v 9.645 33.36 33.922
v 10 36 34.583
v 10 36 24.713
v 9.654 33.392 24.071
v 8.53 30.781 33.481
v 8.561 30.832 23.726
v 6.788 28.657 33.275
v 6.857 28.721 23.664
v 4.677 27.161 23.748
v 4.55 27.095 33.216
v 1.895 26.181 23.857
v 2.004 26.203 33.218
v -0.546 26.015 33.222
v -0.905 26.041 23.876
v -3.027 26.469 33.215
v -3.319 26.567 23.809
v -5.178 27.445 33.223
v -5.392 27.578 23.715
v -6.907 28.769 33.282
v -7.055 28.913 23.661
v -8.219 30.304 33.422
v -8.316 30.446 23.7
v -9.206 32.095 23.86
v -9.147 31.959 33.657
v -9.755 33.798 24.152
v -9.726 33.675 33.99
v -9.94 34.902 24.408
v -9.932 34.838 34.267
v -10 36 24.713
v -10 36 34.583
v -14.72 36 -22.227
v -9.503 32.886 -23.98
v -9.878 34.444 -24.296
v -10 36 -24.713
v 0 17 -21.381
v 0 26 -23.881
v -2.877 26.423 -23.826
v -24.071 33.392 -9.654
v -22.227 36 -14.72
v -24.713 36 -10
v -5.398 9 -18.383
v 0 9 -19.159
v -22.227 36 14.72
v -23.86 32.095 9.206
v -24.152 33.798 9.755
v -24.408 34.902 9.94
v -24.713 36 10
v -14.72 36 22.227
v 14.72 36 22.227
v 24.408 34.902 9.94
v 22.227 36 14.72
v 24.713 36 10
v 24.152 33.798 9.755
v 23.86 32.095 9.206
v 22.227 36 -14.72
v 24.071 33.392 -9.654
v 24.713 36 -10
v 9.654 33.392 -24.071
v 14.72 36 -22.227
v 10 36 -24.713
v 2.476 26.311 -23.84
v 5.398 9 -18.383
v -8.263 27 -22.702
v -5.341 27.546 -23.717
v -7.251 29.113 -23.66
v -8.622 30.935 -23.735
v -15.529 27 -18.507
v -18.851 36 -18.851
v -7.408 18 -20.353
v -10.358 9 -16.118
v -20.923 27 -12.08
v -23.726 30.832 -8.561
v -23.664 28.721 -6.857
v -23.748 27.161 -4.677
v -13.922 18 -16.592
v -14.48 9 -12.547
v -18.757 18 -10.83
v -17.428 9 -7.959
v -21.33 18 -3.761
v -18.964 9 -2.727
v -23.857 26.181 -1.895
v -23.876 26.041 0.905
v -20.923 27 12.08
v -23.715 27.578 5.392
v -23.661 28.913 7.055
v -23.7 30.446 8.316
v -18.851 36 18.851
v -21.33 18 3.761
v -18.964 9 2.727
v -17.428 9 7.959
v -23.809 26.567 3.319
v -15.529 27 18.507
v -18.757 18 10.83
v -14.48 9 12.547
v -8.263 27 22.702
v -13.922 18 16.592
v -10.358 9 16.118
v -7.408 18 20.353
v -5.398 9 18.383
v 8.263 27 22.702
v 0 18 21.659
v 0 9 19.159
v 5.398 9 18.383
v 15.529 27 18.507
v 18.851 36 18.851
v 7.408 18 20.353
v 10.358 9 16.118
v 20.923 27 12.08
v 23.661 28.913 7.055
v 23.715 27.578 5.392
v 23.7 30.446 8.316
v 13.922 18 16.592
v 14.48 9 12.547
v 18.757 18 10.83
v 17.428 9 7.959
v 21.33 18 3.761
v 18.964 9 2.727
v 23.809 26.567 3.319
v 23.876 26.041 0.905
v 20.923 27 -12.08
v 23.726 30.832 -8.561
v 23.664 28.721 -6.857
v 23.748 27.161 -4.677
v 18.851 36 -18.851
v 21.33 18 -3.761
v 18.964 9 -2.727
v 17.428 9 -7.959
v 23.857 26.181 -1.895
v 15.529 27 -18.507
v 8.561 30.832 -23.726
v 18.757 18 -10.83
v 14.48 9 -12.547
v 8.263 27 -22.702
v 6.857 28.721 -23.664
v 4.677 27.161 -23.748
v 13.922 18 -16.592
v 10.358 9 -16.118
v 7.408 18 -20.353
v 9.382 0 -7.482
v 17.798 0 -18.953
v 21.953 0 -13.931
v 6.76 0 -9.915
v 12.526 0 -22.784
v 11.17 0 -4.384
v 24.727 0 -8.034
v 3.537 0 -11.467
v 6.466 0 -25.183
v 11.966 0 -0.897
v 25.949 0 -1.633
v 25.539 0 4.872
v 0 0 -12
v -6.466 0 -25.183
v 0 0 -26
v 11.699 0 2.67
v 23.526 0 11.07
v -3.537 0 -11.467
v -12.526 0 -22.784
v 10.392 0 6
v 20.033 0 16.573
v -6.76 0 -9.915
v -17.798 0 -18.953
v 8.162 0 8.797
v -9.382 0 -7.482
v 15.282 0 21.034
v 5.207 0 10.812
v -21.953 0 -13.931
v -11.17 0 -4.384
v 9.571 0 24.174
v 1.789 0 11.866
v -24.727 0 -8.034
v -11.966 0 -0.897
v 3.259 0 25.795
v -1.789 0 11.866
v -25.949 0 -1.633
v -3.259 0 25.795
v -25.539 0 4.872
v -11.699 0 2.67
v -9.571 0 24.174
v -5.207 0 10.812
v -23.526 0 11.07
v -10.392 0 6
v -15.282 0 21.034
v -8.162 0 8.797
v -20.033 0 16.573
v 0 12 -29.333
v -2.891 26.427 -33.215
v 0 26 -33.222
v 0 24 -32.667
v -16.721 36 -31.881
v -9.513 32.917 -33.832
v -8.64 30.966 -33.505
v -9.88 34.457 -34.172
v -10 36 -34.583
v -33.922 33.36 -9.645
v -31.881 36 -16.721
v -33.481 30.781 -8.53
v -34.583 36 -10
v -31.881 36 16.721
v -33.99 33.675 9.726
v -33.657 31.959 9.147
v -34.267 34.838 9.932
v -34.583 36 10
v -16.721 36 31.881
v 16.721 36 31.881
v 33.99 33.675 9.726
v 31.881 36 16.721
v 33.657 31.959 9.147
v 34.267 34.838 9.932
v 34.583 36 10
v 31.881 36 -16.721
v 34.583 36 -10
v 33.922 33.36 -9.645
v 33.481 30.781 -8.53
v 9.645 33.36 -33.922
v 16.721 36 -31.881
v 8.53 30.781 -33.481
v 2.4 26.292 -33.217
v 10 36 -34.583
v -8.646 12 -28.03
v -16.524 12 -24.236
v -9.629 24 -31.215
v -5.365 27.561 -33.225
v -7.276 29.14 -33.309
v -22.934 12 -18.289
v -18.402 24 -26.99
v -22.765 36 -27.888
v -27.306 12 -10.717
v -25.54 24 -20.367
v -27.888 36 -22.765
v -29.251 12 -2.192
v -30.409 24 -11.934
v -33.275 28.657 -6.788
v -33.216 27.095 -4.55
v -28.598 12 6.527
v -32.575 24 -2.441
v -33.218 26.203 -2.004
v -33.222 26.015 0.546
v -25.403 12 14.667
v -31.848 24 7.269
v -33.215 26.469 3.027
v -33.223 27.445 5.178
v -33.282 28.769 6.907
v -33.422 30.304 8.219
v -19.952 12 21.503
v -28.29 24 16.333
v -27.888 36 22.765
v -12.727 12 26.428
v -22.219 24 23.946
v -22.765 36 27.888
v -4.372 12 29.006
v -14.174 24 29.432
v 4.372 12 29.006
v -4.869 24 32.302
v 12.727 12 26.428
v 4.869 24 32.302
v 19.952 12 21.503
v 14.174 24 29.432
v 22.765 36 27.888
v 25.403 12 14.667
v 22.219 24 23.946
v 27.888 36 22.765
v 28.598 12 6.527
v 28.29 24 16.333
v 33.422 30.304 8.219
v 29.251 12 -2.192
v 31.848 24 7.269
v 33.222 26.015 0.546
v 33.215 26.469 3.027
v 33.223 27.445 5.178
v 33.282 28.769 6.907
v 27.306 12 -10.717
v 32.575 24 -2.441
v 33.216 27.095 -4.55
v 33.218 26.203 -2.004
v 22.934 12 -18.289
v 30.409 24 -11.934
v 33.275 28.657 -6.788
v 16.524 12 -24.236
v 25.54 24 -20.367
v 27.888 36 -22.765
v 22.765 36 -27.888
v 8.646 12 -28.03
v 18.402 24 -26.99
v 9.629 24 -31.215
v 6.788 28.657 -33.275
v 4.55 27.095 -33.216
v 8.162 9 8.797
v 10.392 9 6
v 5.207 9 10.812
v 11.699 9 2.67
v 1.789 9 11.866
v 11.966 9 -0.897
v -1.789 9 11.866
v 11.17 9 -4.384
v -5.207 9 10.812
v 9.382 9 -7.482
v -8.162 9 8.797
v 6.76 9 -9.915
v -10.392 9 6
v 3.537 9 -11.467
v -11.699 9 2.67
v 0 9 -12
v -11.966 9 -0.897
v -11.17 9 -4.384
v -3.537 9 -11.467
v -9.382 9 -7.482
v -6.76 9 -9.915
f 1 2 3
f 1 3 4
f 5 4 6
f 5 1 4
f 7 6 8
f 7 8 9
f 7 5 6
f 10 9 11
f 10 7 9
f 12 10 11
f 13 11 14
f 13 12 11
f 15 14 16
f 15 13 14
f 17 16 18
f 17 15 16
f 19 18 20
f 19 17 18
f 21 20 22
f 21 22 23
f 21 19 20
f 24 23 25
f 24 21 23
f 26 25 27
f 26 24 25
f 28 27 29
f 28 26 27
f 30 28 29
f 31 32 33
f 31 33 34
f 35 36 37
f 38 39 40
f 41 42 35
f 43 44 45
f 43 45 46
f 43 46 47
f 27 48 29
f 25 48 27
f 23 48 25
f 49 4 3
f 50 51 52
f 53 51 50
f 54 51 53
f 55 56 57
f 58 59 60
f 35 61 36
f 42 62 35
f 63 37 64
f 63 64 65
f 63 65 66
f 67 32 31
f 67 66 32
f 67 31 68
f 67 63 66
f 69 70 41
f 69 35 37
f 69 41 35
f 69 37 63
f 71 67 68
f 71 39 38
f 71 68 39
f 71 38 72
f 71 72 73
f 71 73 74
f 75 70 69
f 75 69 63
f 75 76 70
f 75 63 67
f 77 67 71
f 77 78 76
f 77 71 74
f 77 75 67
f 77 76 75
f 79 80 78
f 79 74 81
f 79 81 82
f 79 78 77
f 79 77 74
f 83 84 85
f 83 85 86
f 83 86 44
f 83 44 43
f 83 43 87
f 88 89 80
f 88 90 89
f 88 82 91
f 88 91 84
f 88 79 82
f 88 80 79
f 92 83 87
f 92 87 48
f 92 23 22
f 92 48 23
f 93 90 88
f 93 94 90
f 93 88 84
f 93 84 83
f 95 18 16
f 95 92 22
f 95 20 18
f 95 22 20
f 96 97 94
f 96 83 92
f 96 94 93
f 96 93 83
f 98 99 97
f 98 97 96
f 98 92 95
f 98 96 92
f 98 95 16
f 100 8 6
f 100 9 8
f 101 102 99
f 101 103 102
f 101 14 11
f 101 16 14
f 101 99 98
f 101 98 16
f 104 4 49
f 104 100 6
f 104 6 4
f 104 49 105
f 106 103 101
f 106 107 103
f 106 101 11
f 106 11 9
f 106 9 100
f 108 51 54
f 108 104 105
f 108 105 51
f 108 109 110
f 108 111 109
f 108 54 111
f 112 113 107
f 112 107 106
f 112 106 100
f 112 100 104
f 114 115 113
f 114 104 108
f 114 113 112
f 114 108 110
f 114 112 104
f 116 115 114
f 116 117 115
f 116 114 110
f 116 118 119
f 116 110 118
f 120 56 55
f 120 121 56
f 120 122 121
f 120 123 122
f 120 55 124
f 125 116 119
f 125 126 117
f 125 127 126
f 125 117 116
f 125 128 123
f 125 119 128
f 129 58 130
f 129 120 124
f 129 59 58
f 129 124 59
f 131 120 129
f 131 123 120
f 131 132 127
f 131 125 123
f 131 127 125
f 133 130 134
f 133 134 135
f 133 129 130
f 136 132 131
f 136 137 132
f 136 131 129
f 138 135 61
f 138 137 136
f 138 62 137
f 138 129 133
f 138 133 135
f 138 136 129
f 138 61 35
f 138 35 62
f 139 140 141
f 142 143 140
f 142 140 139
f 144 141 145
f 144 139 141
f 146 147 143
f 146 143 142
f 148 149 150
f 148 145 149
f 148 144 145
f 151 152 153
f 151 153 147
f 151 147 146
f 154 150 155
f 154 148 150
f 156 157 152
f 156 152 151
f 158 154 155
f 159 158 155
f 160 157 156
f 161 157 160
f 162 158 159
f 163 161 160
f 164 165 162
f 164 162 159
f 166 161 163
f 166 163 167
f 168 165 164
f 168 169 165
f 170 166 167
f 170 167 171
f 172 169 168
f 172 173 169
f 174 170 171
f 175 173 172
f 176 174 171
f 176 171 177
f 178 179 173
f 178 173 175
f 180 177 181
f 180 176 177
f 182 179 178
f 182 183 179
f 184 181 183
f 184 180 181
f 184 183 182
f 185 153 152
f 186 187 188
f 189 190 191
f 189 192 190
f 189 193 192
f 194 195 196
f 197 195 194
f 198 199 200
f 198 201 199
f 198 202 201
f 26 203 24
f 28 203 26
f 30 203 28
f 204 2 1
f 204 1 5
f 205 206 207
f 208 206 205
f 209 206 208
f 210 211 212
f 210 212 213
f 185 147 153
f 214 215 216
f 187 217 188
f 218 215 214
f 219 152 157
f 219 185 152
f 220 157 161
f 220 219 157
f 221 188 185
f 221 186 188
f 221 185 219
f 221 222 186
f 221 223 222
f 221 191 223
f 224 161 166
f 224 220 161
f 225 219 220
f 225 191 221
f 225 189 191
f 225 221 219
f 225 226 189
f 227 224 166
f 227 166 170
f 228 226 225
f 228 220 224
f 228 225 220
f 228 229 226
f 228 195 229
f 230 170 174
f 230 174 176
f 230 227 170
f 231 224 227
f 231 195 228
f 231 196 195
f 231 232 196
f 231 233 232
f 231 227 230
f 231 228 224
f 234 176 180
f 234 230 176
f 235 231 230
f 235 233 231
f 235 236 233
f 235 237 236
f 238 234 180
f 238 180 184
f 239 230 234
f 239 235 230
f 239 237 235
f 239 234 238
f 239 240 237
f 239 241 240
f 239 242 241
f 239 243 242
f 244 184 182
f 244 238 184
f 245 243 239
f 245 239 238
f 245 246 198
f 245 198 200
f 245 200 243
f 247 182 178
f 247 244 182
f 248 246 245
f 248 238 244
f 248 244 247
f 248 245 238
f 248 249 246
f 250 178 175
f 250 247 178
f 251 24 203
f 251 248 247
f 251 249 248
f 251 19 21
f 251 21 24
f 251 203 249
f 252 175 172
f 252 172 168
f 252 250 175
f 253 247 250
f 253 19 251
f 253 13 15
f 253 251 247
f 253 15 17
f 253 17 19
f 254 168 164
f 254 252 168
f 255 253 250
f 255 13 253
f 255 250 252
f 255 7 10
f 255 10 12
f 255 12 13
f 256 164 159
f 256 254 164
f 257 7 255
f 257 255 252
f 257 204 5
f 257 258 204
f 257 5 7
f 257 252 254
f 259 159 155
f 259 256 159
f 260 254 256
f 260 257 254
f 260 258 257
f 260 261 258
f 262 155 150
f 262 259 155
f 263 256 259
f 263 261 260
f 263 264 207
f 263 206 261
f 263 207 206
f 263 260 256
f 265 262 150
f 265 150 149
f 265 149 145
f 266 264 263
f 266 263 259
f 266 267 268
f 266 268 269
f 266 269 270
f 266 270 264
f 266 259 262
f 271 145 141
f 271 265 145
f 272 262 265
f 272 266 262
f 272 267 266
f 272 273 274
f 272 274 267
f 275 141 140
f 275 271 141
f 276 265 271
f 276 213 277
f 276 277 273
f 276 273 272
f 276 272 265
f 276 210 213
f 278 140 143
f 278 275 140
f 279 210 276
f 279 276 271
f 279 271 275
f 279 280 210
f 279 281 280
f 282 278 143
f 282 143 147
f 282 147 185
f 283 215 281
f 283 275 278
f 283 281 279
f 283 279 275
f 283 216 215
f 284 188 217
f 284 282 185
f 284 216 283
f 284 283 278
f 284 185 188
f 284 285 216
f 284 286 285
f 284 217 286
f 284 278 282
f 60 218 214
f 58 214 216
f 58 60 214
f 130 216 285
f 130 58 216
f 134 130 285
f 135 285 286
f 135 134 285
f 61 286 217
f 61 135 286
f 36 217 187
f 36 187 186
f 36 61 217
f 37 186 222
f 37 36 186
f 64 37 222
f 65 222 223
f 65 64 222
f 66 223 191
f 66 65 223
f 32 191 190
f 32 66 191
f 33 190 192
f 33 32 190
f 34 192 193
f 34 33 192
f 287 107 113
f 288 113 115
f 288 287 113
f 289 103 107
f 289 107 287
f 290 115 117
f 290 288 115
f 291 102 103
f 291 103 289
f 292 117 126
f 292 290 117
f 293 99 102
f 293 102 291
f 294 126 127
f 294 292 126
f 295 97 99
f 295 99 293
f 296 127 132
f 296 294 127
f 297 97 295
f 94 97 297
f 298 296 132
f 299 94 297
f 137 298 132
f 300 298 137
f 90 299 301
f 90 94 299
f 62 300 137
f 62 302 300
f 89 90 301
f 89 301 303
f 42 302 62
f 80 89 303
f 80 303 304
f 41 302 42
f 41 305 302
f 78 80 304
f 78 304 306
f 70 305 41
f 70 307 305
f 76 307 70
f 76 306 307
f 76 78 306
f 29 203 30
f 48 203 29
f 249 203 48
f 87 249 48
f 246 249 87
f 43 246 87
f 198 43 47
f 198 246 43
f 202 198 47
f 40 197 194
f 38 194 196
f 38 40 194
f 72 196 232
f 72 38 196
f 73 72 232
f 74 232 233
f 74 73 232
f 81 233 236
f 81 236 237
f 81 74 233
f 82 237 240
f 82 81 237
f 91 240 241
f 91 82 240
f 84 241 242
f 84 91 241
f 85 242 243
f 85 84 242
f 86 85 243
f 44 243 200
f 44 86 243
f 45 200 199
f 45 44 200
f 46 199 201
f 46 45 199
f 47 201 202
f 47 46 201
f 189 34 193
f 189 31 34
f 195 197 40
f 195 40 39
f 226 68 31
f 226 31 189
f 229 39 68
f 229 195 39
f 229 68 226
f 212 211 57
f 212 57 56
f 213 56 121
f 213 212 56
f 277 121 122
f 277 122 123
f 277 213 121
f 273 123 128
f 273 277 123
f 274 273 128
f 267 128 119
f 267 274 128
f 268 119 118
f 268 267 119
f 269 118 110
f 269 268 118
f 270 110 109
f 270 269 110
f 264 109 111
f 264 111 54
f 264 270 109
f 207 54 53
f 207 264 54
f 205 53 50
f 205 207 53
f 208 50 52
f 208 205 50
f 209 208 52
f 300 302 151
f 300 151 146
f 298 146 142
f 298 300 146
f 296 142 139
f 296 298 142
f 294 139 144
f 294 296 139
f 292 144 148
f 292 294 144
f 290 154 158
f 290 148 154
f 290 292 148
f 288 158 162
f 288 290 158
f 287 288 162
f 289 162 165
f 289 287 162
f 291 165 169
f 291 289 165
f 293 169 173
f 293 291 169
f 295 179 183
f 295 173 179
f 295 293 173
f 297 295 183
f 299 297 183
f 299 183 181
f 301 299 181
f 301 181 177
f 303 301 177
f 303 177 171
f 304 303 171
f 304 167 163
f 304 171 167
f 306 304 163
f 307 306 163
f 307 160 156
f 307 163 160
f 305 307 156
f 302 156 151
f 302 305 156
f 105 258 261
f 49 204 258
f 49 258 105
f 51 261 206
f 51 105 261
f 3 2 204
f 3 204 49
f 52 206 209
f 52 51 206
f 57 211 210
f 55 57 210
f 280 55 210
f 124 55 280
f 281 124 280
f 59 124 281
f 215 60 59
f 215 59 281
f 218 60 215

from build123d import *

# Parameters (mm, degrees)
CUT_EXTRUDE1_DEPTH      = 63.353829072
CIRPATTERN1_COUNT       = 4
CUT_EXTRUDE2_DEPTH      = 61.728905976
CUT_EXTRUDE2_DEPTH_BACK = 61.728905976
SKETCH4_R               = 12


with BuildPart() as part:
    # Sketch1 → Revolve1 (revolve)
    with BuildSketch(Plane.XY, mode=Mode.PRIVATE) as revolve1_sk:
        Polygon((0, 9), (0, 0), (26, 0), (36, 36), (26.659229154, 36), (19.159229154, 9), align=None)
    revolve(revolve1_sk.sketch.rotate(Axis((0, 0, 0), (0, 1, 0)), 90), axis=Axis((0, 0, 0), (0, 1, 0)))

    # Sketch2 → Cut-Extrude1 (cut, symmetric)
    with BuildSketch(Plane(origin=(0, 0, 0), x_dir=(0, 0, -1), z_dir=(1, 0, 0))):
        with BuildLine():
            Line((-10, 36), (10, 36))
            ThreePointArc((10, 36), (0, 26), (-10, 36))
        make_face()
    cut_extrude1 = extrude(amount=CUT_EXTRUDE1_DEPTH, both=True, mode=Mode.SUBTRACT)

    # CirPattern1: Cut-Extrude1 ×4 about axis
    cirpattern1_axis = Axis((0, 0, 0), (0, -1, 0))
    for i in range(1, CIRPATTERN1_COUNT):
        add(cut_extrude1.rotate(cirpattern1_axis, i * 360 / CIRPATTERN1_COUNT), mode=Mode.SUBTRACT)

    # Sketch4 → Cut-Extrude2 (cut, two sides: drawn at the far end of the back side and taken through both)
    with BuildSketch(Plane.XZ.offset(-CUT_EXTRUDE2_DEPTH_BACK)):
        with Locations(Location((0, 0, 0), (0, 0, 270))):
            Circle(SKETCH4_R)
    extrude(amount=CUT_EXTRUDE2_DEPTH + CUT_EXTRUDE2_DEPTH_BACK, mode=Mode.SUBTRACT)


solid = part.part
